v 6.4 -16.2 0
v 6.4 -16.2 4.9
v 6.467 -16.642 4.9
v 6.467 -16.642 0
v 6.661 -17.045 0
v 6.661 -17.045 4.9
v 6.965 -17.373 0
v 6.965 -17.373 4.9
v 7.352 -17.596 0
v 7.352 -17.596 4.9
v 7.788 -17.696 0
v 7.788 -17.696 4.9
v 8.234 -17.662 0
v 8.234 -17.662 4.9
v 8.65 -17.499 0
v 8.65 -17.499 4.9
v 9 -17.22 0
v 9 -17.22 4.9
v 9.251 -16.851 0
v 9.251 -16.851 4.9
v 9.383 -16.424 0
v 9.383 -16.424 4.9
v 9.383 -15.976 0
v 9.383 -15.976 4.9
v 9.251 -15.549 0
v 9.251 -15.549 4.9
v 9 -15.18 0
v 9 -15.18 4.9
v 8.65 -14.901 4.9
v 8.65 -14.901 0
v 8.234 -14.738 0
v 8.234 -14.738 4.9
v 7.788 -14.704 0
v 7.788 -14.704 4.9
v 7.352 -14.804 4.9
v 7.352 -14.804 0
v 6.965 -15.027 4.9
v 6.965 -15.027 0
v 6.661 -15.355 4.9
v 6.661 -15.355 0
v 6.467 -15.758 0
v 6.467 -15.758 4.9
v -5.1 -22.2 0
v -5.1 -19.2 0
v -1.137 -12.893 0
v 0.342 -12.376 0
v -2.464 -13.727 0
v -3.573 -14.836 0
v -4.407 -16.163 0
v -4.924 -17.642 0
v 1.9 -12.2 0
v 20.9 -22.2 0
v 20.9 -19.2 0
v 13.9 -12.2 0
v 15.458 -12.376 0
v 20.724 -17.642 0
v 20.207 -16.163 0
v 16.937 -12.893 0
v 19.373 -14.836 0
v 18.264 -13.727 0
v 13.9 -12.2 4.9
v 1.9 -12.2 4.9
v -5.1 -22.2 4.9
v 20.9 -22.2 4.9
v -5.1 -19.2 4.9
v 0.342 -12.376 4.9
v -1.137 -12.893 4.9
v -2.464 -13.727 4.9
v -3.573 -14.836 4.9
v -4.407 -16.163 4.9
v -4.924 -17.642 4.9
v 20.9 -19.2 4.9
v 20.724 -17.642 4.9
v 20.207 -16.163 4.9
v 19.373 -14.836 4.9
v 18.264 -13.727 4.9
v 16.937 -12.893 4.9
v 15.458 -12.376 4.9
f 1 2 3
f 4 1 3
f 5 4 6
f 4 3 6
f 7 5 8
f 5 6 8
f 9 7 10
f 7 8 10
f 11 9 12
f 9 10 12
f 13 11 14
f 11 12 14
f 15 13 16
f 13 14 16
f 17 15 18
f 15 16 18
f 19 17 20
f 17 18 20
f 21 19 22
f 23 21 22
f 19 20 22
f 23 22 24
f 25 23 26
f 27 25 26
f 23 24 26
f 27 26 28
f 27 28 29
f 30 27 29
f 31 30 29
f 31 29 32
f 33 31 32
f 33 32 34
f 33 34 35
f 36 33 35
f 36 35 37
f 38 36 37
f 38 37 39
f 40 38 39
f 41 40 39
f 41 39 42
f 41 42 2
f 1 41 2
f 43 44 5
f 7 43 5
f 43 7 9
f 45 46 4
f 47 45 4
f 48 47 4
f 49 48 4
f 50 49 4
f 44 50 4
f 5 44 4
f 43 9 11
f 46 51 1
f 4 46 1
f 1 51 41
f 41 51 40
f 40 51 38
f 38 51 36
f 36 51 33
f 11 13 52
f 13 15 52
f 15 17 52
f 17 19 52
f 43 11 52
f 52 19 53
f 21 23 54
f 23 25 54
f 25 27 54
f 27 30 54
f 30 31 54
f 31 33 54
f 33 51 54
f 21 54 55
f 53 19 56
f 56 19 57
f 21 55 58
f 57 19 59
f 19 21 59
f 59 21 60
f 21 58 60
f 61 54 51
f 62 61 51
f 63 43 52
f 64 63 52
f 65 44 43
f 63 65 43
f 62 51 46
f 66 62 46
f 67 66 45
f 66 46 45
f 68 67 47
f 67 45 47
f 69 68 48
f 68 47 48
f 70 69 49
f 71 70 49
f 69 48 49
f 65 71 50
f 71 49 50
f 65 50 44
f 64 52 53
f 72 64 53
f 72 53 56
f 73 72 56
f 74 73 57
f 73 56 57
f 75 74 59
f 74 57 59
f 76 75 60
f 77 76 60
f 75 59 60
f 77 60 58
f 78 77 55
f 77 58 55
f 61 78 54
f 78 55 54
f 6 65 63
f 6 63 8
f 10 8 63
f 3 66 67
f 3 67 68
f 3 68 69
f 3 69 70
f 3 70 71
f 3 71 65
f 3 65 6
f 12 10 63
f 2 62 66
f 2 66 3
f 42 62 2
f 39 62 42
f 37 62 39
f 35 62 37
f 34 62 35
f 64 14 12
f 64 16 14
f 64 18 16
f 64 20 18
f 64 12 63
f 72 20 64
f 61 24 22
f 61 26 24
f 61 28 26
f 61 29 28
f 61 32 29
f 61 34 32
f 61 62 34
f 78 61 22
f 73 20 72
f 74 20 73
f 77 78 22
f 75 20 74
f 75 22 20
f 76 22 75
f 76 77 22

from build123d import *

# Parameters (mm, degrees)
F1_DEPTH = 10
F0_W     = 26
F0_H     = 12
F2_DEPTH = 5
F3_D     = 3
F5_DEPTH = 4.9
F6_D     = 3


with BuildPart() as f1:
    # F0 (on Top) → F1 (new body)
    with BuildSketch(Plane.XY):
        Polygon((20.9, 30.9), (20.9, 16.5), (17.9, 16.5), (17.9, 13.2), (19.4, 11.7), (20.9, 11.7), (20.9, 4.9), (14.1, 4.9), (14.1, 6.4), (12.6, 7.9), (9.3, 7.9), (9.3, 4.9), (-5.1, 4.9), (-5.1, -0.1), (20.9, -0.1), (25.9, 4.9), (25.9, 30.9), align=None)
    extrude(amount=F1_DEPTH)

    # F0 (on Top) → F2 (join)
    with BuildSketch(Plane.XY):
        with Locations((7.9, -6.1)):
            Rectangle(F0_W, F0_H)
    extrude(amount=F2_DEPTH)

    # F3 (through all)
    with Locations(Plane(origin=(0, 0, 0), x_dir=(1, 0, 0), z_dir=(0, 0, -1))):
        with Locations((7.8999996185, 8.1)):
            Hole(F3_D / 2)


with BuildPart() as f5:
    # F4 (on Top) → F5 (new body)
    with BuildSketch(Plane.XY):
        with BuildLine():
            ThreePointArc((20.9, -19.2), (18.8497474683, -14.2502525317), (13.9, -12.2))
            Line((13.9, -12.2), (1.9, -12.2))
            ThreePointArc((1.9, -12.2), (-3.0497474683, -14.2502525317), (-5.1, -19.2))
            Line((-5.1, -19.2), (-5.1, -22.2))
            Line((-5.1, -22.2), (20.9, -22.2))
            Line((20.9, -22.2), (20.9, -19.2))
        make_face()
    extrude(amount=F5_DEPTH)

    # F6 (through all)
    with Locations(Plane(origin=(0, 0, 0), x_dir=(1, 0, 0), z_dir=(0, 0, -1))):
        with Locations((7.9, 16.2)):
            Hole(F6_D / 2)


solid = f5.part
